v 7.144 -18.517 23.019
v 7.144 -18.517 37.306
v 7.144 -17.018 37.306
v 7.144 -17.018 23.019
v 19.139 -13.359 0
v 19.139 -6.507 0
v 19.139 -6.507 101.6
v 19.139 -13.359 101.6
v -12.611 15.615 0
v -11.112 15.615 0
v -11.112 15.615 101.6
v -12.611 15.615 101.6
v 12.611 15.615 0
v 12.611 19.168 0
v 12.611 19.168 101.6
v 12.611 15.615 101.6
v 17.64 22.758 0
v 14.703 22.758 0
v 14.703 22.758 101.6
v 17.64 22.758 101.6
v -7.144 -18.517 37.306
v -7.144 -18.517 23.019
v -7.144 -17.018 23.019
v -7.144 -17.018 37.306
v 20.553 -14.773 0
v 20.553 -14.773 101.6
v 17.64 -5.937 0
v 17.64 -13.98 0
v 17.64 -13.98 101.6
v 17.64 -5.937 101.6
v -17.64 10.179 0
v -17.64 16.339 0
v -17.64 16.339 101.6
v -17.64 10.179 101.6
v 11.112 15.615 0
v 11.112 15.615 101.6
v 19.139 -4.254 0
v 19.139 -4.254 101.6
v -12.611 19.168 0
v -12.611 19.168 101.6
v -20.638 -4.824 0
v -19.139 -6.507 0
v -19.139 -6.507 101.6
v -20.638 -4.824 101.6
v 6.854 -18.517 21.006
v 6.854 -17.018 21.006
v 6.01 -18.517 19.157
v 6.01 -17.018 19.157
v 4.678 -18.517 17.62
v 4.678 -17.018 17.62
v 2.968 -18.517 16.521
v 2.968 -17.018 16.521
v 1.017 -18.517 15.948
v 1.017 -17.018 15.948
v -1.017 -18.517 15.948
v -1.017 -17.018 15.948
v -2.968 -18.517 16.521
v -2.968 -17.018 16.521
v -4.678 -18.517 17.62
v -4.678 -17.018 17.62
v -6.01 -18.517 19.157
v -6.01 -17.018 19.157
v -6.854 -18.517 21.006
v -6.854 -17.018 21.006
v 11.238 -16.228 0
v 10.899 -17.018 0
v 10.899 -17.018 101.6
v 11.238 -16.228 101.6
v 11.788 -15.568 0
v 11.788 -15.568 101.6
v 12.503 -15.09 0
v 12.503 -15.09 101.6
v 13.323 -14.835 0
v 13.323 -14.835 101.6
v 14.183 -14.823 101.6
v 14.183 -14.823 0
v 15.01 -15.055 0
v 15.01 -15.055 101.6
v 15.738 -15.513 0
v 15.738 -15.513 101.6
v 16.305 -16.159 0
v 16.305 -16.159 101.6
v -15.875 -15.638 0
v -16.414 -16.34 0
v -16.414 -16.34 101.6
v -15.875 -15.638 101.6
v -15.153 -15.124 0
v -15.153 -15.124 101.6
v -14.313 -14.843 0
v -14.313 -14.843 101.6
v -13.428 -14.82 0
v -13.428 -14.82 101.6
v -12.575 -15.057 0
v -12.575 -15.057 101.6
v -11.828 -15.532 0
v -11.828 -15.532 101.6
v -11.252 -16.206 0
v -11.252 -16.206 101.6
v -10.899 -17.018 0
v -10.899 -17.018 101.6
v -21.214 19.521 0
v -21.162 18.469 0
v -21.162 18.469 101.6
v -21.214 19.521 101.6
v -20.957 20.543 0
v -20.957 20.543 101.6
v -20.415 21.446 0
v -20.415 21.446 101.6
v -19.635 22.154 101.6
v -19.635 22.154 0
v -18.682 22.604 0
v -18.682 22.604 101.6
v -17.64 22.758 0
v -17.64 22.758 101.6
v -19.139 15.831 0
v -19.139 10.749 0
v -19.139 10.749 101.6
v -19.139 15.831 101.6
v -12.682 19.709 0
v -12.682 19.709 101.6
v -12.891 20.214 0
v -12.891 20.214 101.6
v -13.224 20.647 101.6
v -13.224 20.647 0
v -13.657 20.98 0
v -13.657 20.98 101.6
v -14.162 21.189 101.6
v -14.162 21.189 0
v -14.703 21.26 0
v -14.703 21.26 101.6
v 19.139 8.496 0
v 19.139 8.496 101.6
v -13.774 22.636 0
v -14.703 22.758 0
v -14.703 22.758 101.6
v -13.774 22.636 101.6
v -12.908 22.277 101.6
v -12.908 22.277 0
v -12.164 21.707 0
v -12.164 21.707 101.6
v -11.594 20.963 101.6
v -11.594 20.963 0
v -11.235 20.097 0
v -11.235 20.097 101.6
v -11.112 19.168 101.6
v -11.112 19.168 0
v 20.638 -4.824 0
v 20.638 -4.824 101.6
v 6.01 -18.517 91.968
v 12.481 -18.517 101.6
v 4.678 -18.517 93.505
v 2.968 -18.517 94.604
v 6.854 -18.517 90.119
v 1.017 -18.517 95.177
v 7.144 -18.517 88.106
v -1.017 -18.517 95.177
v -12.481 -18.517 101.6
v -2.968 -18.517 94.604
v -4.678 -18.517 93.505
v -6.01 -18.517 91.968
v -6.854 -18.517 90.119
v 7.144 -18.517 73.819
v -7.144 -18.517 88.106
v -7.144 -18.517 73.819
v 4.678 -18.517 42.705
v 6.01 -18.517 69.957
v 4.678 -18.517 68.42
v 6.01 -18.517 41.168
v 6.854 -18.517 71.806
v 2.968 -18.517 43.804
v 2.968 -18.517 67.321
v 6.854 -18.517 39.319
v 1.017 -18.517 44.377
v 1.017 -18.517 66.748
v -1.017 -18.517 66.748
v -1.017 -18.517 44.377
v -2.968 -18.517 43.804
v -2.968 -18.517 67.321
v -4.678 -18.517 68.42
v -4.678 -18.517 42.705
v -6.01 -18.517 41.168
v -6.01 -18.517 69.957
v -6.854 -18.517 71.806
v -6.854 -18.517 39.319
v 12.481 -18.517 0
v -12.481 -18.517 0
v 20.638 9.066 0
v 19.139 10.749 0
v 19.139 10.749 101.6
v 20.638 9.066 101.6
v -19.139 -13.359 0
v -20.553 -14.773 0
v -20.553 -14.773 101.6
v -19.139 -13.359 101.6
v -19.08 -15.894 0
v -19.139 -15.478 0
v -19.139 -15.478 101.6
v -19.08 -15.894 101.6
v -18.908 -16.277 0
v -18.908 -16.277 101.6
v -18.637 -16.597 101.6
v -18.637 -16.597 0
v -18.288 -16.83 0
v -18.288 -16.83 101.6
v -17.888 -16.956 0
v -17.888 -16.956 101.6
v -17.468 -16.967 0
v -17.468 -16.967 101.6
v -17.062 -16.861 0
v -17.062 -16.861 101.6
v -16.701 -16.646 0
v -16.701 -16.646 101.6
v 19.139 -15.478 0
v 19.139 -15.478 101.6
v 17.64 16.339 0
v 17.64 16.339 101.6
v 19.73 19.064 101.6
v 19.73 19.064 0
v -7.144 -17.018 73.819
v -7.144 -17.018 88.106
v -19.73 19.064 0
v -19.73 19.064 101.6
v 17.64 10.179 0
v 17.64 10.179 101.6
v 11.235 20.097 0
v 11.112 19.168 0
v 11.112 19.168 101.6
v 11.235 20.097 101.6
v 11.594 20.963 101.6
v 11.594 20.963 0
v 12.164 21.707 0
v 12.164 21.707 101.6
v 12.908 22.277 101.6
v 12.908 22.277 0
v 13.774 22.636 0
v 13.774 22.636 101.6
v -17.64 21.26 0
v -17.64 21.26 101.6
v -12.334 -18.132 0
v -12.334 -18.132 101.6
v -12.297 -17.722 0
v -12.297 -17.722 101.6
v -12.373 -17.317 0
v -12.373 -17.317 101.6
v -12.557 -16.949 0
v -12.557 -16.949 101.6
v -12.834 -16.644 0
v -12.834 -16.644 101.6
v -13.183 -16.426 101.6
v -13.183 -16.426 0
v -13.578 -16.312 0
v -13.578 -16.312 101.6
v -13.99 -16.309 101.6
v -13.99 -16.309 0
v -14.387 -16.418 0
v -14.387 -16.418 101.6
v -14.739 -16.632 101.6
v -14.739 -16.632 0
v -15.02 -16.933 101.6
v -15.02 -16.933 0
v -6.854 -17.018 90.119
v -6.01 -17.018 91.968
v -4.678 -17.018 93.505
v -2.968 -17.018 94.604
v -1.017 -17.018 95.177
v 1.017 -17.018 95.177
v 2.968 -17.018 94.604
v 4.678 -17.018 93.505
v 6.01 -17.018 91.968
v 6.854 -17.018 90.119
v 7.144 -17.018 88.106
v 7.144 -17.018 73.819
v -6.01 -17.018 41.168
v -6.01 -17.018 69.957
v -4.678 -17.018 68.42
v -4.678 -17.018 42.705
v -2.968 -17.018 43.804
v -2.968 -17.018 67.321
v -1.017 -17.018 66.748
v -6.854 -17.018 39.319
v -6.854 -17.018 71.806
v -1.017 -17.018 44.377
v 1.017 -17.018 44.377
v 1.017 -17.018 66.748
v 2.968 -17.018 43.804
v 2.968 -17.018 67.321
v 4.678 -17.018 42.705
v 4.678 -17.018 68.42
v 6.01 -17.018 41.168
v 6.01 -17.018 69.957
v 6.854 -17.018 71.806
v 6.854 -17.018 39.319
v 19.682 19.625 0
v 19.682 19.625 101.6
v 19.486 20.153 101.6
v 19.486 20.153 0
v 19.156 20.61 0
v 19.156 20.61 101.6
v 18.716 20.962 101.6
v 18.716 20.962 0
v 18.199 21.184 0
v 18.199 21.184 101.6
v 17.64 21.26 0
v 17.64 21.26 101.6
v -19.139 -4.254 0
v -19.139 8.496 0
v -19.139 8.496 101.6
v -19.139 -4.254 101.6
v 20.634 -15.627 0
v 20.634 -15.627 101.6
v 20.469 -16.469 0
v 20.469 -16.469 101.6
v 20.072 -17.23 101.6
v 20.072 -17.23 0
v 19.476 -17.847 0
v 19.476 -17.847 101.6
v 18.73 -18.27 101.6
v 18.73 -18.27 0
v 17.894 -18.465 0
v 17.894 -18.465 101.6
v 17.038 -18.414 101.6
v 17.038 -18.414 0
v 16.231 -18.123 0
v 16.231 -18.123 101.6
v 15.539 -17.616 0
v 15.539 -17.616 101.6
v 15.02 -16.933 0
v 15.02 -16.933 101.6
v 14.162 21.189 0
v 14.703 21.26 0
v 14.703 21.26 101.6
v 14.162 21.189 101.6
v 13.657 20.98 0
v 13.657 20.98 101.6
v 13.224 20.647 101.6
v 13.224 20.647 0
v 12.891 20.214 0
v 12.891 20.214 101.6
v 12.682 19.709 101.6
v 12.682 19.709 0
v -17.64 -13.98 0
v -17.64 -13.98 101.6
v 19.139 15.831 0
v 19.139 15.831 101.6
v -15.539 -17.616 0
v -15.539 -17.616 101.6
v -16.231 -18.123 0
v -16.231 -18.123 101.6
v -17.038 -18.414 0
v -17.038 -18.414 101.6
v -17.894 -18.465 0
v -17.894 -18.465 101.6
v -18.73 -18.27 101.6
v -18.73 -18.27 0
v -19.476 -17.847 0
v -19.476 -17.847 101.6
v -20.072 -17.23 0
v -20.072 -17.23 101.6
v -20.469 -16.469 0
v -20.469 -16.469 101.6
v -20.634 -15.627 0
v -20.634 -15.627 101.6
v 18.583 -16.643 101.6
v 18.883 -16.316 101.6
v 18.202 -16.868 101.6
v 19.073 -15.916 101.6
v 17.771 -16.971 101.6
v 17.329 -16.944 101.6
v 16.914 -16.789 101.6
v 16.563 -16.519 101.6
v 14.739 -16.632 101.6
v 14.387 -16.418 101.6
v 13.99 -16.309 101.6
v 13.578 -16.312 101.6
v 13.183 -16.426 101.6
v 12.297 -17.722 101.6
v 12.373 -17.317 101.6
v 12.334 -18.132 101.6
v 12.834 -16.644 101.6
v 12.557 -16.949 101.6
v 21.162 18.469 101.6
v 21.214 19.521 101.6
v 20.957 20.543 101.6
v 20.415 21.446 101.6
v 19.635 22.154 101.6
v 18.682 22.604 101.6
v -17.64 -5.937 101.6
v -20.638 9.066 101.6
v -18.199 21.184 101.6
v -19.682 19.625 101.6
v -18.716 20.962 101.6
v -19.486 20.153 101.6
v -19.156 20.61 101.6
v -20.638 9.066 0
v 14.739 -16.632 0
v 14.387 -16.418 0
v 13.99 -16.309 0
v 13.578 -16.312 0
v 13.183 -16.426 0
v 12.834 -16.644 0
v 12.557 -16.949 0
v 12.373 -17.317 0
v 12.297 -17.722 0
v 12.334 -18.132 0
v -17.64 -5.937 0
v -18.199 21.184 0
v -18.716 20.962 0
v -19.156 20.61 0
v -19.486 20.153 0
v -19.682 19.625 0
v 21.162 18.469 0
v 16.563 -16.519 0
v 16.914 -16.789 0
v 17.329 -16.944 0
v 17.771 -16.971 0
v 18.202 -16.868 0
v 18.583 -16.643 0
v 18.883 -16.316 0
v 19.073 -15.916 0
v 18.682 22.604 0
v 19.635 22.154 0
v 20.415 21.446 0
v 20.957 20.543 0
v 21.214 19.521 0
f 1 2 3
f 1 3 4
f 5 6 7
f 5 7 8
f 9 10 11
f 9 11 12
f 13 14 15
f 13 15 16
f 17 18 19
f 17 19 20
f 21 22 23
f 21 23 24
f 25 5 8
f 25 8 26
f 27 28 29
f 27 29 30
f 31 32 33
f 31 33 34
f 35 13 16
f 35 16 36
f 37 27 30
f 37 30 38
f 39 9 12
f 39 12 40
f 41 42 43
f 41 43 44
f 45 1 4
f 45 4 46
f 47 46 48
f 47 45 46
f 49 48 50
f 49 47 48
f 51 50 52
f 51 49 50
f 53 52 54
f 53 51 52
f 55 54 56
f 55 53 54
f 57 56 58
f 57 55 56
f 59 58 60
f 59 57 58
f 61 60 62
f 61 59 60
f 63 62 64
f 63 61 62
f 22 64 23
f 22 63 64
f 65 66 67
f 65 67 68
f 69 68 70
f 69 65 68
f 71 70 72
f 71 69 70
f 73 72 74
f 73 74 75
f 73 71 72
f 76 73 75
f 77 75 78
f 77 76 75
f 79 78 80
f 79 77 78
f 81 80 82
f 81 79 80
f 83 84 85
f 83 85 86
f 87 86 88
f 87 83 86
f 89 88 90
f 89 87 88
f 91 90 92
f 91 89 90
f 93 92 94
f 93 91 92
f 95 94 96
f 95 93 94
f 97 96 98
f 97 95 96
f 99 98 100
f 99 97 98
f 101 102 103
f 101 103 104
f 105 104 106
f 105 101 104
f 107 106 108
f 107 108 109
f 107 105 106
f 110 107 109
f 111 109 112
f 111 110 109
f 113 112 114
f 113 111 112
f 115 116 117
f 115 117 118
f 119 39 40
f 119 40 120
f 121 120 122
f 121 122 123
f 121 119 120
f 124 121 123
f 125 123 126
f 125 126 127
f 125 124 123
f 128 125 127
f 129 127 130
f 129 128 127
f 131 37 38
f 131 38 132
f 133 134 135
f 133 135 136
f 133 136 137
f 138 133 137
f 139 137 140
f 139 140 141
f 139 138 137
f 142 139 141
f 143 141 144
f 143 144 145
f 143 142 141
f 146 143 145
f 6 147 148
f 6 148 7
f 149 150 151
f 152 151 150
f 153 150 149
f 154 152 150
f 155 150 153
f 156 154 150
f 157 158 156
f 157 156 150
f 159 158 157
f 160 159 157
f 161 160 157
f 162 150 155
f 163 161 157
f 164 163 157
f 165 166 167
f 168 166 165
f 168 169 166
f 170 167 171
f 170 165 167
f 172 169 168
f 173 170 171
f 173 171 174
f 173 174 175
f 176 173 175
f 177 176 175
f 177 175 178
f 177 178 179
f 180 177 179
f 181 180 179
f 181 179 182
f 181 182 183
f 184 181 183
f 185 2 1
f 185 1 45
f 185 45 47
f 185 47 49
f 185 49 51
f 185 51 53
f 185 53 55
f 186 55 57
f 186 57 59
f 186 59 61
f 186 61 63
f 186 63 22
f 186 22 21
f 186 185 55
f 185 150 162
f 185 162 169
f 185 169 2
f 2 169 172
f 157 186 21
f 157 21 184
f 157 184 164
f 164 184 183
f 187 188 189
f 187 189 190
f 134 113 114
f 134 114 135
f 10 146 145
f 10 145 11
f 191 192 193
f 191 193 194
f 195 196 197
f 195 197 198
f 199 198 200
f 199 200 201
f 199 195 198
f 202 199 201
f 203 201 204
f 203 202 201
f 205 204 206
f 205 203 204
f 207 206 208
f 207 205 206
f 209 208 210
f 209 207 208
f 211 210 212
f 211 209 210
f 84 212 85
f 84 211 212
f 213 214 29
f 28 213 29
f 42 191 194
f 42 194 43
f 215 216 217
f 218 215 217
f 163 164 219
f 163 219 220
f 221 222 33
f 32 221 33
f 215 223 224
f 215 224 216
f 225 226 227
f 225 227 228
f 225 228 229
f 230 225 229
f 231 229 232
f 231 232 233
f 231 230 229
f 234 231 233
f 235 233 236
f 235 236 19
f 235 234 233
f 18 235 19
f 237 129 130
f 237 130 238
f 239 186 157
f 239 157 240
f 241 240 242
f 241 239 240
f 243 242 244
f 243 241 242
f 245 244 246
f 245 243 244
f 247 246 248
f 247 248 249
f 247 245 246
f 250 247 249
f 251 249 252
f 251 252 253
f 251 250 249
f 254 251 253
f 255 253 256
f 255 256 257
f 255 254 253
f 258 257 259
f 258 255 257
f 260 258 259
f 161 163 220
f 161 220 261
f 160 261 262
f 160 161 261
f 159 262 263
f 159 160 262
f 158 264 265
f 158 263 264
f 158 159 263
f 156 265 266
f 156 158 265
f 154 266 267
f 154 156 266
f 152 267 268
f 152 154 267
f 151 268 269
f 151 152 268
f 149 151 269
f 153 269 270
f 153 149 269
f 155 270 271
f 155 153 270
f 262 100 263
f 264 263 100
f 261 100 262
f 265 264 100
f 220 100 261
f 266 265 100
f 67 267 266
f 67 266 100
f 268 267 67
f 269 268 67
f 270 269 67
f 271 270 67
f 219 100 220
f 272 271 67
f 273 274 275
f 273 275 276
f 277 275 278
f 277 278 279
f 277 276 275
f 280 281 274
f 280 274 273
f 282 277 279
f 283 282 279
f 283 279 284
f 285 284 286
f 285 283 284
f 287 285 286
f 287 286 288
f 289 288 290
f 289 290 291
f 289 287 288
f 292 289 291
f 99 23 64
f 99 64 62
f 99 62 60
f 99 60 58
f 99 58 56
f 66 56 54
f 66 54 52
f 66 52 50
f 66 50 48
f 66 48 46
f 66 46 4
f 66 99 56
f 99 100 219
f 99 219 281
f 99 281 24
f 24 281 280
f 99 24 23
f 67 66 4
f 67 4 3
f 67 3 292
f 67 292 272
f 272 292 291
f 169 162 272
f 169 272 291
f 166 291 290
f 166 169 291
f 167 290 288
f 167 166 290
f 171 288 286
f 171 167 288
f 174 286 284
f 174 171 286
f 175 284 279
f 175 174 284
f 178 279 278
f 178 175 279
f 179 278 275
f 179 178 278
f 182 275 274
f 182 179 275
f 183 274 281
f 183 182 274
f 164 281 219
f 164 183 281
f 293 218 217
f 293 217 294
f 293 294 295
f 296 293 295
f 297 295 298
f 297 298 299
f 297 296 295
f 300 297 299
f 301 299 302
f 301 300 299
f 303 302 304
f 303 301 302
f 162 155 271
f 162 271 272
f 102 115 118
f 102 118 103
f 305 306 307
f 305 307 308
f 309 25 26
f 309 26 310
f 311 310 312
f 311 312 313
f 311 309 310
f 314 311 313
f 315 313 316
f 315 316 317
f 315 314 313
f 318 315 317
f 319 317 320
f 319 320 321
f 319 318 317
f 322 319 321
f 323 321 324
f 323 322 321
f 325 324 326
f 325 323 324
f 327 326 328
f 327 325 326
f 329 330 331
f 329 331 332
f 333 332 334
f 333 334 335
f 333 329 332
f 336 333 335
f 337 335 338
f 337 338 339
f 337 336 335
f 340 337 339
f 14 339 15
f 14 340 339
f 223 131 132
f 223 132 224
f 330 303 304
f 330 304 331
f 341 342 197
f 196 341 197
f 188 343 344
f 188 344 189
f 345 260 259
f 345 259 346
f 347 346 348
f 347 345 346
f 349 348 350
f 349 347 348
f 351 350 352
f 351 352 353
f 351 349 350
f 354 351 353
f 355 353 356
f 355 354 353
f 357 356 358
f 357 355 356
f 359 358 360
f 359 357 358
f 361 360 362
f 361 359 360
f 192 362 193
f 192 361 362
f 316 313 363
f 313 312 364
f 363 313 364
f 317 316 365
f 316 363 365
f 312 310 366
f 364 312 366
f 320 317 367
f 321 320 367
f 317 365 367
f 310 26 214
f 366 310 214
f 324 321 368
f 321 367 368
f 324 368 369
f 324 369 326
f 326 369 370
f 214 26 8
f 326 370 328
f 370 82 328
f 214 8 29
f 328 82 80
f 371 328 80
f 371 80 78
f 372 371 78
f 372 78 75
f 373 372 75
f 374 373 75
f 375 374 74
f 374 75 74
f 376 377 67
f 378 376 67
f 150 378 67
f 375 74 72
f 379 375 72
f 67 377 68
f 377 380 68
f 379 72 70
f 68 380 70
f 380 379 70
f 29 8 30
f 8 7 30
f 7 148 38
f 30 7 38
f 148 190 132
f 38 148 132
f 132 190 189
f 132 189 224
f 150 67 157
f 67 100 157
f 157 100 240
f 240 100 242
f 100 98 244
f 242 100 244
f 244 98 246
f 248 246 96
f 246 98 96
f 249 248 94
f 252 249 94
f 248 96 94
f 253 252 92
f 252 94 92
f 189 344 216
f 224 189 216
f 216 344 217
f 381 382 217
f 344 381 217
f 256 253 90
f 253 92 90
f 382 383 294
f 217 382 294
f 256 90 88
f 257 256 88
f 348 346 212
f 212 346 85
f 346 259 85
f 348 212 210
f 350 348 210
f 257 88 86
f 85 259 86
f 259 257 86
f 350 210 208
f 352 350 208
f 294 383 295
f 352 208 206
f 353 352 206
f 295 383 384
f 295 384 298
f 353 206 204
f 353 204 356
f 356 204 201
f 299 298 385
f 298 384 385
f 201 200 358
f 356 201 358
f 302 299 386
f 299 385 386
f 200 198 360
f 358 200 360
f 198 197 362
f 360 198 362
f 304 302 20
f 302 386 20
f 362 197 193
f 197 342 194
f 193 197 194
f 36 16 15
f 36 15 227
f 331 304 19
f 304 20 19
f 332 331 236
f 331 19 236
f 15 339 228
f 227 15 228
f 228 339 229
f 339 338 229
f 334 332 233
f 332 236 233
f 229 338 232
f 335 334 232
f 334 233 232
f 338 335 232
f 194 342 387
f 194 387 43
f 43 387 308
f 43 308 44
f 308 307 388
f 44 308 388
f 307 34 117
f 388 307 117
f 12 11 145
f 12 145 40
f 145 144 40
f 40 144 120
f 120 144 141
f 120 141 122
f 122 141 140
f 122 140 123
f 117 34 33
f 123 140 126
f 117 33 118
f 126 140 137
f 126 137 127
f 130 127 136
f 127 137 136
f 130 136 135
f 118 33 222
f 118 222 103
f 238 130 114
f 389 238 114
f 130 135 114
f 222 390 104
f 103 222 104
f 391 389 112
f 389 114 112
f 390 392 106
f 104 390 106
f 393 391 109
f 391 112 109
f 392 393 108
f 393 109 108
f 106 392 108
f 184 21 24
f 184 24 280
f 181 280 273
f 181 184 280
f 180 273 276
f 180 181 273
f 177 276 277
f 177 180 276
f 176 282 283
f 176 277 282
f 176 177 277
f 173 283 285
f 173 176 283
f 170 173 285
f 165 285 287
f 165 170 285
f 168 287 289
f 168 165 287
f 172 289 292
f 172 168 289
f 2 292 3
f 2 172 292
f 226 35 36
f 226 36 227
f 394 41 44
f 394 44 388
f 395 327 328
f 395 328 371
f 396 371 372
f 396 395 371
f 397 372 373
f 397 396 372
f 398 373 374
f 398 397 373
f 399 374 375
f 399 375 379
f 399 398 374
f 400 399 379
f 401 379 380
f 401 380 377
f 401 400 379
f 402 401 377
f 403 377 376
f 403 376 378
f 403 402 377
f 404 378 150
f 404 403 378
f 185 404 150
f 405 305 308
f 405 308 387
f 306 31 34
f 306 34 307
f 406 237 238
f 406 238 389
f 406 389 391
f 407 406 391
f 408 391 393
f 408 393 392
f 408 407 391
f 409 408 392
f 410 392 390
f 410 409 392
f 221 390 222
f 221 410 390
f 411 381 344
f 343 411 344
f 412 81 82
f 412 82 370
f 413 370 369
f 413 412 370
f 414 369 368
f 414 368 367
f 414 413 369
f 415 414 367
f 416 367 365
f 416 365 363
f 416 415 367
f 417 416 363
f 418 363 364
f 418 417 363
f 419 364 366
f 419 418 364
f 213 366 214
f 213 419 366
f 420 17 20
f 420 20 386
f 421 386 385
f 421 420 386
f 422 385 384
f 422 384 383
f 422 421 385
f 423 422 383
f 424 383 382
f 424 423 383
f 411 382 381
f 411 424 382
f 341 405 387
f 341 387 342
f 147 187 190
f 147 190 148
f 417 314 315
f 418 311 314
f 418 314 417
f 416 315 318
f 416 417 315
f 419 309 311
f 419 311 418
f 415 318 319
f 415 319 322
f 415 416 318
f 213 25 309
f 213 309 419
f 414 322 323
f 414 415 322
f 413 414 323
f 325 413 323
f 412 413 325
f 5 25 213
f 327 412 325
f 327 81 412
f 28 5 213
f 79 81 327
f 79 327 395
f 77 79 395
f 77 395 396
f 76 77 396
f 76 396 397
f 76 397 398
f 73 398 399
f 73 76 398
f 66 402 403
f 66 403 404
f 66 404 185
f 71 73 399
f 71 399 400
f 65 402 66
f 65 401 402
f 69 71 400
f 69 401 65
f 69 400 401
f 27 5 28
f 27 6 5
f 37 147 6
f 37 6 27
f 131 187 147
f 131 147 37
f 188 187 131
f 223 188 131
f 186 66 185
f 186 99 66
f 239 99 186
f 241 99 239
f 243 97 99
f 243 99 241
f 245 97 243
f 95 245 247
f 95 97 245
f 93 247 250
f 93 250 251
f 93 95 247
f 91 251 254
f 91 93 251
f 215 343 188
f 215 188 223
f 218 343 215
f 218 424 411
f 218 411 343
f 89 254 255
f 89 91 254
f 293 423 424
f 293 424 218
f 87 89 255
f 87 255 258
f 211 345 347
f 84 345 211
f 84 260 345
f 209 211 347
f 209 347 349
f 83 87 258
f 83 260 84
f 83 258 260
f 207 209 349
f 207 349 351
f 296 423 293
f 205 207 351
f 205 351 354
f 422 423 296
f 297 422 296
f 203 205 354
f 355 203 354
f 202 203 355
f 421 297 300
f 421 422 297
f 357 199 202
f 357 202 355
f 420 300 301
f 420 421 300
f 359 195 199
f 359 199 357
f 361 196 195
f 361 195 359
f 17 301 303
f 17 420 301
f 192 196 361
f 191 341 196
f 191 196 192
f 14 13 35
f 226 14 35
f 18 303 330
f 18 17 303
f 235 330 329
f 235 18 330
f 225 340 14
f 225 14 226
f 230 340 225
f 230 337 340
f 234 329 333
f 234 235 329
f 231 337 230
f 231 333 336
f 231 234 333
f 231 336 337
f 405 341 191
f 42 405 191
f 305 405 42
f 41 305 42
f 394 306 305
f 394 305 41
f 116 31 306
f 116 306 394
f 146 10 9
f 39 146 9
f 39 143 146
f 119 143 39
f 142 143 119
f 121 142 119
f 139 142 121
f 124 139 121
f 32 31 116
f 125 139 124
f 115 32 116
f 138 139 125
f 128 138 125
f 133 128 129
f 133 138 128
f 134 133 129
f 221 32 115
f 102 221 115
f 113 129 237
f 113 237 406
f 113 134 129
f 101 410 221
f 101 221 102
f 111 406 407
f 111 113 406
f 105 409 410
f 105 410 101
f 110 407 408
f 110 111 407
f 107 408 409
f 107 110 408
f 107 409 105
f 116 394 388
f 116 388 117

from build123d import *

# Parameters (mm, degrees)
BASE_EXTRUDE_DEPTH = 101.6
SLOT_DEPTH         = 127.877735455
LPATTERN1_COUNT    = 2
LPATTERN1_PITCH    = 50.8


with BuildPart() as part:
    # Sketch1 → Base-Extrude (new body)
    with BuildSketch(Plane.XY):
        with BuildLine():
            Line((17.6403, 16.339286512), (19.729882578, 19.063533504))
            ThreePointArc((19.729882578, 19.063533504), (19.156045845, 20.609744632), (17.6403, 21.2598))
            Line((17.6403, 21.2598), (14.70327367, 21.2598))
            ThreePointArc((14.70327367, 21.2598), (13.223883481, 20.647016519), (12.6111, 19.16762633))
            Line((12.6111, 19.16762633), (12.6111, 15.61465))
            Line((12.6111, 15.61465), (11.1125, 15.61465))
            Line((11.1125, 15.61465), (11.1125, 19.16762633))
            ThreePointArc((11.1125, 19.16762633), (12.164213258, 21.706686742), (14.70327367, 22.7584))
            Line((14.70327367, 22.7584), (17.6403, 22.7584))
            ThreePointArc((17.6403, 22.7584), (20.415434554, 21.446284653), (21.162428673, 18.4688666))
            Line((21.162428673, 18.4688666), (19.1389, 15.830735923))
            Line((19.1389, 15.830735923), (19.1389, 10.749129415))
            Line((19.1389, 10.749129415), (20.6375, 9.0662125))
            Line((20.6375, 9.0662125), (20.6375, -4.8244125))
            Line((20.6375, -4.8244125), (19.1389, -6.507329415))
            Line((19.1389, -6.507329415), (19.1389, -13.358784555))
            Line((19.1389, -13.358784555), (20.553458003, -14.773342558))
            ThreePointArc((20.553458003, -14.773342558), (18.729942105, -18.270236732), (15.019825564, -16.932883251))
            ThreePointArc((15.019825564, -16.932883251), (13.000752562, -16.523120627), (12.480559153, -18.5166))
            Line((12.480559153, -18.5166), (-12.480559153, -18.5166))
            ThreePointArc((-12.480559153, -18.5166), (-13.000752562, -16.523120627), (-15.019825564, -16.932883251))
            ThreePointArc((-15.019825564, -16.932883251), (-18.729942105, -18.270236732), (-20.553458003, -14.773342558))
            Line((-20.553458003, -14.773342558), (-19.1389, -13.358784555))
            Line((-19.1389, -13.358784555), (-19.1389, -6.507329415))
            Line((-19.1389, -6.507329415), (-20.6375, -4.8244125))
            Line((-20.6375, -4.8244125), (-20.6375, 9.0662125))
            Line((-20.6375, 9.0662125), (-19.1389, 10.749129415))
            Line((-19.1389, 10.749129415), (-19.1389, 15.830735923))
            Line((-19.1389, 15.830735923), (-21.162428673, 18.4688666))
            ThreePointArc((-21.162428673, 18.4688666), (-20.415434554, 21.446284653), (-17.6403, 22.7584))
            Line((-17.6403, 22.7584), (-14.70327367, 22.7584))
            ThreePointArc((-14.70327367, 22.7584), (-12.164213258, 21.706686742), (-11.1125, 19.16762633))
            Line((-11.1125, 19.16762633), (-11.1125, 15.61465))
            Line((-11.1125, 15.61465), (-12.6111, 15.61465))
            Line((-12.6111, 15.61465), (-12.6111, 19.16762633))
            ThreePointArc((-12.6111, 19.16762633), (-13.223883481, 20.647016519), (-14.70327367, 21.2598))
            Line((-14.70327367, 21.2598), (-17.6403, 21.2598))
            ThreePointArc((-17.6403, 21.2598), (-19.156045845, 20.609744632), (-19.729882578, 19.063533504))
            Line((-19.729882578, 19.063533504), (-17.6403, 16.339286512))
            Line((-17.6403, 16.339286512), (-17.6403, 10.17860201))
            Line((-17.6403, 10.17860201), (-19.1389, 8.495685095))
            Line((-19.1389, 8.495685095), (-19.1389, -4.253885095))
            Line((-19.1389, -4.253885095), (-17.6403, -5.93680201))
            Line((-17.6403, -5.93680201), (-17.6403, -13.979525))
            Line((-17.6403, -13.979525), (-19.1389, -15.478125))
            ThreePointArc((-19.1389, -15.478125), (-18.092238669, -16.906954381), (-16.414285827, -16.33992034))
            ThreePointArc((-16.414285827, -16.33992034), (-13.428073412, -14.819877156), (-10.898992189, -17.018))
            Line((-10.898992189, -17.018), (10.898992189, -17.018))
            ThreePointArc((10.898992189, -17.018), (13.323359075, -14.834630878), (16.30518861, -16.15877141))
            ThreePointArc((16.30518861, -16.15877141), (17.990302879, -16.935279743), (19.1389, -15.478125))
            Line((19.1389, -15.478125), (17.6403, -13.979525))
            Line((17.6403, -13.979525), (17.6403, -5.93680201))
            Line((17.6403, -5.93680201), (19.1389, -4.253885095))
            Line((19.1389, -4.253885095), (19.1389, 8.495685095))
            Line((19.1389, 8.495685095), (17.6403, 10.17860201))
            Line((17.6403, 10.17860201), (17.6403, 16.339286512))
        make_face()
    extrude(amount=BASE_EXTRUDE_DEPTH)

    # Sketch2 → Slot (cut, through all)
    with BuildSketch(Plane(origin=(-0.093451067, -18.5166, -16.466077999), x_dir=(1, 0, 0), z_dir=(0, -1, 0))):
        with BuildLine():
            Line((7.237201067, 53.772327999), (7.237201067, 39.484827999))
            ThreePointArc((7.237201067, 39.484827999), (0.093451067, 32.341077999), (-7.050298933, 39.484827999))
            Line((-7.050298933, 39.484827999), (-7.050298933, 53.772327999))
            ThreePointArc((-7.050298933, 53.772327999), (0.093451067, 60.916077999), (7.237201067, 53.772327999))
        make_face()
    slot = extrude(amount=-SLOT_DEPTH, mode=Mode.SUBTRACT)

    # LPattern1: Slot ×2
    with Locations(*[(0, 0, i * LPATTERN1_PITCH) for i in range(1, LPATTERN1_COUNT)]):
        add(slot, mode=Mode.SUBTRACT)


solid = part.part
